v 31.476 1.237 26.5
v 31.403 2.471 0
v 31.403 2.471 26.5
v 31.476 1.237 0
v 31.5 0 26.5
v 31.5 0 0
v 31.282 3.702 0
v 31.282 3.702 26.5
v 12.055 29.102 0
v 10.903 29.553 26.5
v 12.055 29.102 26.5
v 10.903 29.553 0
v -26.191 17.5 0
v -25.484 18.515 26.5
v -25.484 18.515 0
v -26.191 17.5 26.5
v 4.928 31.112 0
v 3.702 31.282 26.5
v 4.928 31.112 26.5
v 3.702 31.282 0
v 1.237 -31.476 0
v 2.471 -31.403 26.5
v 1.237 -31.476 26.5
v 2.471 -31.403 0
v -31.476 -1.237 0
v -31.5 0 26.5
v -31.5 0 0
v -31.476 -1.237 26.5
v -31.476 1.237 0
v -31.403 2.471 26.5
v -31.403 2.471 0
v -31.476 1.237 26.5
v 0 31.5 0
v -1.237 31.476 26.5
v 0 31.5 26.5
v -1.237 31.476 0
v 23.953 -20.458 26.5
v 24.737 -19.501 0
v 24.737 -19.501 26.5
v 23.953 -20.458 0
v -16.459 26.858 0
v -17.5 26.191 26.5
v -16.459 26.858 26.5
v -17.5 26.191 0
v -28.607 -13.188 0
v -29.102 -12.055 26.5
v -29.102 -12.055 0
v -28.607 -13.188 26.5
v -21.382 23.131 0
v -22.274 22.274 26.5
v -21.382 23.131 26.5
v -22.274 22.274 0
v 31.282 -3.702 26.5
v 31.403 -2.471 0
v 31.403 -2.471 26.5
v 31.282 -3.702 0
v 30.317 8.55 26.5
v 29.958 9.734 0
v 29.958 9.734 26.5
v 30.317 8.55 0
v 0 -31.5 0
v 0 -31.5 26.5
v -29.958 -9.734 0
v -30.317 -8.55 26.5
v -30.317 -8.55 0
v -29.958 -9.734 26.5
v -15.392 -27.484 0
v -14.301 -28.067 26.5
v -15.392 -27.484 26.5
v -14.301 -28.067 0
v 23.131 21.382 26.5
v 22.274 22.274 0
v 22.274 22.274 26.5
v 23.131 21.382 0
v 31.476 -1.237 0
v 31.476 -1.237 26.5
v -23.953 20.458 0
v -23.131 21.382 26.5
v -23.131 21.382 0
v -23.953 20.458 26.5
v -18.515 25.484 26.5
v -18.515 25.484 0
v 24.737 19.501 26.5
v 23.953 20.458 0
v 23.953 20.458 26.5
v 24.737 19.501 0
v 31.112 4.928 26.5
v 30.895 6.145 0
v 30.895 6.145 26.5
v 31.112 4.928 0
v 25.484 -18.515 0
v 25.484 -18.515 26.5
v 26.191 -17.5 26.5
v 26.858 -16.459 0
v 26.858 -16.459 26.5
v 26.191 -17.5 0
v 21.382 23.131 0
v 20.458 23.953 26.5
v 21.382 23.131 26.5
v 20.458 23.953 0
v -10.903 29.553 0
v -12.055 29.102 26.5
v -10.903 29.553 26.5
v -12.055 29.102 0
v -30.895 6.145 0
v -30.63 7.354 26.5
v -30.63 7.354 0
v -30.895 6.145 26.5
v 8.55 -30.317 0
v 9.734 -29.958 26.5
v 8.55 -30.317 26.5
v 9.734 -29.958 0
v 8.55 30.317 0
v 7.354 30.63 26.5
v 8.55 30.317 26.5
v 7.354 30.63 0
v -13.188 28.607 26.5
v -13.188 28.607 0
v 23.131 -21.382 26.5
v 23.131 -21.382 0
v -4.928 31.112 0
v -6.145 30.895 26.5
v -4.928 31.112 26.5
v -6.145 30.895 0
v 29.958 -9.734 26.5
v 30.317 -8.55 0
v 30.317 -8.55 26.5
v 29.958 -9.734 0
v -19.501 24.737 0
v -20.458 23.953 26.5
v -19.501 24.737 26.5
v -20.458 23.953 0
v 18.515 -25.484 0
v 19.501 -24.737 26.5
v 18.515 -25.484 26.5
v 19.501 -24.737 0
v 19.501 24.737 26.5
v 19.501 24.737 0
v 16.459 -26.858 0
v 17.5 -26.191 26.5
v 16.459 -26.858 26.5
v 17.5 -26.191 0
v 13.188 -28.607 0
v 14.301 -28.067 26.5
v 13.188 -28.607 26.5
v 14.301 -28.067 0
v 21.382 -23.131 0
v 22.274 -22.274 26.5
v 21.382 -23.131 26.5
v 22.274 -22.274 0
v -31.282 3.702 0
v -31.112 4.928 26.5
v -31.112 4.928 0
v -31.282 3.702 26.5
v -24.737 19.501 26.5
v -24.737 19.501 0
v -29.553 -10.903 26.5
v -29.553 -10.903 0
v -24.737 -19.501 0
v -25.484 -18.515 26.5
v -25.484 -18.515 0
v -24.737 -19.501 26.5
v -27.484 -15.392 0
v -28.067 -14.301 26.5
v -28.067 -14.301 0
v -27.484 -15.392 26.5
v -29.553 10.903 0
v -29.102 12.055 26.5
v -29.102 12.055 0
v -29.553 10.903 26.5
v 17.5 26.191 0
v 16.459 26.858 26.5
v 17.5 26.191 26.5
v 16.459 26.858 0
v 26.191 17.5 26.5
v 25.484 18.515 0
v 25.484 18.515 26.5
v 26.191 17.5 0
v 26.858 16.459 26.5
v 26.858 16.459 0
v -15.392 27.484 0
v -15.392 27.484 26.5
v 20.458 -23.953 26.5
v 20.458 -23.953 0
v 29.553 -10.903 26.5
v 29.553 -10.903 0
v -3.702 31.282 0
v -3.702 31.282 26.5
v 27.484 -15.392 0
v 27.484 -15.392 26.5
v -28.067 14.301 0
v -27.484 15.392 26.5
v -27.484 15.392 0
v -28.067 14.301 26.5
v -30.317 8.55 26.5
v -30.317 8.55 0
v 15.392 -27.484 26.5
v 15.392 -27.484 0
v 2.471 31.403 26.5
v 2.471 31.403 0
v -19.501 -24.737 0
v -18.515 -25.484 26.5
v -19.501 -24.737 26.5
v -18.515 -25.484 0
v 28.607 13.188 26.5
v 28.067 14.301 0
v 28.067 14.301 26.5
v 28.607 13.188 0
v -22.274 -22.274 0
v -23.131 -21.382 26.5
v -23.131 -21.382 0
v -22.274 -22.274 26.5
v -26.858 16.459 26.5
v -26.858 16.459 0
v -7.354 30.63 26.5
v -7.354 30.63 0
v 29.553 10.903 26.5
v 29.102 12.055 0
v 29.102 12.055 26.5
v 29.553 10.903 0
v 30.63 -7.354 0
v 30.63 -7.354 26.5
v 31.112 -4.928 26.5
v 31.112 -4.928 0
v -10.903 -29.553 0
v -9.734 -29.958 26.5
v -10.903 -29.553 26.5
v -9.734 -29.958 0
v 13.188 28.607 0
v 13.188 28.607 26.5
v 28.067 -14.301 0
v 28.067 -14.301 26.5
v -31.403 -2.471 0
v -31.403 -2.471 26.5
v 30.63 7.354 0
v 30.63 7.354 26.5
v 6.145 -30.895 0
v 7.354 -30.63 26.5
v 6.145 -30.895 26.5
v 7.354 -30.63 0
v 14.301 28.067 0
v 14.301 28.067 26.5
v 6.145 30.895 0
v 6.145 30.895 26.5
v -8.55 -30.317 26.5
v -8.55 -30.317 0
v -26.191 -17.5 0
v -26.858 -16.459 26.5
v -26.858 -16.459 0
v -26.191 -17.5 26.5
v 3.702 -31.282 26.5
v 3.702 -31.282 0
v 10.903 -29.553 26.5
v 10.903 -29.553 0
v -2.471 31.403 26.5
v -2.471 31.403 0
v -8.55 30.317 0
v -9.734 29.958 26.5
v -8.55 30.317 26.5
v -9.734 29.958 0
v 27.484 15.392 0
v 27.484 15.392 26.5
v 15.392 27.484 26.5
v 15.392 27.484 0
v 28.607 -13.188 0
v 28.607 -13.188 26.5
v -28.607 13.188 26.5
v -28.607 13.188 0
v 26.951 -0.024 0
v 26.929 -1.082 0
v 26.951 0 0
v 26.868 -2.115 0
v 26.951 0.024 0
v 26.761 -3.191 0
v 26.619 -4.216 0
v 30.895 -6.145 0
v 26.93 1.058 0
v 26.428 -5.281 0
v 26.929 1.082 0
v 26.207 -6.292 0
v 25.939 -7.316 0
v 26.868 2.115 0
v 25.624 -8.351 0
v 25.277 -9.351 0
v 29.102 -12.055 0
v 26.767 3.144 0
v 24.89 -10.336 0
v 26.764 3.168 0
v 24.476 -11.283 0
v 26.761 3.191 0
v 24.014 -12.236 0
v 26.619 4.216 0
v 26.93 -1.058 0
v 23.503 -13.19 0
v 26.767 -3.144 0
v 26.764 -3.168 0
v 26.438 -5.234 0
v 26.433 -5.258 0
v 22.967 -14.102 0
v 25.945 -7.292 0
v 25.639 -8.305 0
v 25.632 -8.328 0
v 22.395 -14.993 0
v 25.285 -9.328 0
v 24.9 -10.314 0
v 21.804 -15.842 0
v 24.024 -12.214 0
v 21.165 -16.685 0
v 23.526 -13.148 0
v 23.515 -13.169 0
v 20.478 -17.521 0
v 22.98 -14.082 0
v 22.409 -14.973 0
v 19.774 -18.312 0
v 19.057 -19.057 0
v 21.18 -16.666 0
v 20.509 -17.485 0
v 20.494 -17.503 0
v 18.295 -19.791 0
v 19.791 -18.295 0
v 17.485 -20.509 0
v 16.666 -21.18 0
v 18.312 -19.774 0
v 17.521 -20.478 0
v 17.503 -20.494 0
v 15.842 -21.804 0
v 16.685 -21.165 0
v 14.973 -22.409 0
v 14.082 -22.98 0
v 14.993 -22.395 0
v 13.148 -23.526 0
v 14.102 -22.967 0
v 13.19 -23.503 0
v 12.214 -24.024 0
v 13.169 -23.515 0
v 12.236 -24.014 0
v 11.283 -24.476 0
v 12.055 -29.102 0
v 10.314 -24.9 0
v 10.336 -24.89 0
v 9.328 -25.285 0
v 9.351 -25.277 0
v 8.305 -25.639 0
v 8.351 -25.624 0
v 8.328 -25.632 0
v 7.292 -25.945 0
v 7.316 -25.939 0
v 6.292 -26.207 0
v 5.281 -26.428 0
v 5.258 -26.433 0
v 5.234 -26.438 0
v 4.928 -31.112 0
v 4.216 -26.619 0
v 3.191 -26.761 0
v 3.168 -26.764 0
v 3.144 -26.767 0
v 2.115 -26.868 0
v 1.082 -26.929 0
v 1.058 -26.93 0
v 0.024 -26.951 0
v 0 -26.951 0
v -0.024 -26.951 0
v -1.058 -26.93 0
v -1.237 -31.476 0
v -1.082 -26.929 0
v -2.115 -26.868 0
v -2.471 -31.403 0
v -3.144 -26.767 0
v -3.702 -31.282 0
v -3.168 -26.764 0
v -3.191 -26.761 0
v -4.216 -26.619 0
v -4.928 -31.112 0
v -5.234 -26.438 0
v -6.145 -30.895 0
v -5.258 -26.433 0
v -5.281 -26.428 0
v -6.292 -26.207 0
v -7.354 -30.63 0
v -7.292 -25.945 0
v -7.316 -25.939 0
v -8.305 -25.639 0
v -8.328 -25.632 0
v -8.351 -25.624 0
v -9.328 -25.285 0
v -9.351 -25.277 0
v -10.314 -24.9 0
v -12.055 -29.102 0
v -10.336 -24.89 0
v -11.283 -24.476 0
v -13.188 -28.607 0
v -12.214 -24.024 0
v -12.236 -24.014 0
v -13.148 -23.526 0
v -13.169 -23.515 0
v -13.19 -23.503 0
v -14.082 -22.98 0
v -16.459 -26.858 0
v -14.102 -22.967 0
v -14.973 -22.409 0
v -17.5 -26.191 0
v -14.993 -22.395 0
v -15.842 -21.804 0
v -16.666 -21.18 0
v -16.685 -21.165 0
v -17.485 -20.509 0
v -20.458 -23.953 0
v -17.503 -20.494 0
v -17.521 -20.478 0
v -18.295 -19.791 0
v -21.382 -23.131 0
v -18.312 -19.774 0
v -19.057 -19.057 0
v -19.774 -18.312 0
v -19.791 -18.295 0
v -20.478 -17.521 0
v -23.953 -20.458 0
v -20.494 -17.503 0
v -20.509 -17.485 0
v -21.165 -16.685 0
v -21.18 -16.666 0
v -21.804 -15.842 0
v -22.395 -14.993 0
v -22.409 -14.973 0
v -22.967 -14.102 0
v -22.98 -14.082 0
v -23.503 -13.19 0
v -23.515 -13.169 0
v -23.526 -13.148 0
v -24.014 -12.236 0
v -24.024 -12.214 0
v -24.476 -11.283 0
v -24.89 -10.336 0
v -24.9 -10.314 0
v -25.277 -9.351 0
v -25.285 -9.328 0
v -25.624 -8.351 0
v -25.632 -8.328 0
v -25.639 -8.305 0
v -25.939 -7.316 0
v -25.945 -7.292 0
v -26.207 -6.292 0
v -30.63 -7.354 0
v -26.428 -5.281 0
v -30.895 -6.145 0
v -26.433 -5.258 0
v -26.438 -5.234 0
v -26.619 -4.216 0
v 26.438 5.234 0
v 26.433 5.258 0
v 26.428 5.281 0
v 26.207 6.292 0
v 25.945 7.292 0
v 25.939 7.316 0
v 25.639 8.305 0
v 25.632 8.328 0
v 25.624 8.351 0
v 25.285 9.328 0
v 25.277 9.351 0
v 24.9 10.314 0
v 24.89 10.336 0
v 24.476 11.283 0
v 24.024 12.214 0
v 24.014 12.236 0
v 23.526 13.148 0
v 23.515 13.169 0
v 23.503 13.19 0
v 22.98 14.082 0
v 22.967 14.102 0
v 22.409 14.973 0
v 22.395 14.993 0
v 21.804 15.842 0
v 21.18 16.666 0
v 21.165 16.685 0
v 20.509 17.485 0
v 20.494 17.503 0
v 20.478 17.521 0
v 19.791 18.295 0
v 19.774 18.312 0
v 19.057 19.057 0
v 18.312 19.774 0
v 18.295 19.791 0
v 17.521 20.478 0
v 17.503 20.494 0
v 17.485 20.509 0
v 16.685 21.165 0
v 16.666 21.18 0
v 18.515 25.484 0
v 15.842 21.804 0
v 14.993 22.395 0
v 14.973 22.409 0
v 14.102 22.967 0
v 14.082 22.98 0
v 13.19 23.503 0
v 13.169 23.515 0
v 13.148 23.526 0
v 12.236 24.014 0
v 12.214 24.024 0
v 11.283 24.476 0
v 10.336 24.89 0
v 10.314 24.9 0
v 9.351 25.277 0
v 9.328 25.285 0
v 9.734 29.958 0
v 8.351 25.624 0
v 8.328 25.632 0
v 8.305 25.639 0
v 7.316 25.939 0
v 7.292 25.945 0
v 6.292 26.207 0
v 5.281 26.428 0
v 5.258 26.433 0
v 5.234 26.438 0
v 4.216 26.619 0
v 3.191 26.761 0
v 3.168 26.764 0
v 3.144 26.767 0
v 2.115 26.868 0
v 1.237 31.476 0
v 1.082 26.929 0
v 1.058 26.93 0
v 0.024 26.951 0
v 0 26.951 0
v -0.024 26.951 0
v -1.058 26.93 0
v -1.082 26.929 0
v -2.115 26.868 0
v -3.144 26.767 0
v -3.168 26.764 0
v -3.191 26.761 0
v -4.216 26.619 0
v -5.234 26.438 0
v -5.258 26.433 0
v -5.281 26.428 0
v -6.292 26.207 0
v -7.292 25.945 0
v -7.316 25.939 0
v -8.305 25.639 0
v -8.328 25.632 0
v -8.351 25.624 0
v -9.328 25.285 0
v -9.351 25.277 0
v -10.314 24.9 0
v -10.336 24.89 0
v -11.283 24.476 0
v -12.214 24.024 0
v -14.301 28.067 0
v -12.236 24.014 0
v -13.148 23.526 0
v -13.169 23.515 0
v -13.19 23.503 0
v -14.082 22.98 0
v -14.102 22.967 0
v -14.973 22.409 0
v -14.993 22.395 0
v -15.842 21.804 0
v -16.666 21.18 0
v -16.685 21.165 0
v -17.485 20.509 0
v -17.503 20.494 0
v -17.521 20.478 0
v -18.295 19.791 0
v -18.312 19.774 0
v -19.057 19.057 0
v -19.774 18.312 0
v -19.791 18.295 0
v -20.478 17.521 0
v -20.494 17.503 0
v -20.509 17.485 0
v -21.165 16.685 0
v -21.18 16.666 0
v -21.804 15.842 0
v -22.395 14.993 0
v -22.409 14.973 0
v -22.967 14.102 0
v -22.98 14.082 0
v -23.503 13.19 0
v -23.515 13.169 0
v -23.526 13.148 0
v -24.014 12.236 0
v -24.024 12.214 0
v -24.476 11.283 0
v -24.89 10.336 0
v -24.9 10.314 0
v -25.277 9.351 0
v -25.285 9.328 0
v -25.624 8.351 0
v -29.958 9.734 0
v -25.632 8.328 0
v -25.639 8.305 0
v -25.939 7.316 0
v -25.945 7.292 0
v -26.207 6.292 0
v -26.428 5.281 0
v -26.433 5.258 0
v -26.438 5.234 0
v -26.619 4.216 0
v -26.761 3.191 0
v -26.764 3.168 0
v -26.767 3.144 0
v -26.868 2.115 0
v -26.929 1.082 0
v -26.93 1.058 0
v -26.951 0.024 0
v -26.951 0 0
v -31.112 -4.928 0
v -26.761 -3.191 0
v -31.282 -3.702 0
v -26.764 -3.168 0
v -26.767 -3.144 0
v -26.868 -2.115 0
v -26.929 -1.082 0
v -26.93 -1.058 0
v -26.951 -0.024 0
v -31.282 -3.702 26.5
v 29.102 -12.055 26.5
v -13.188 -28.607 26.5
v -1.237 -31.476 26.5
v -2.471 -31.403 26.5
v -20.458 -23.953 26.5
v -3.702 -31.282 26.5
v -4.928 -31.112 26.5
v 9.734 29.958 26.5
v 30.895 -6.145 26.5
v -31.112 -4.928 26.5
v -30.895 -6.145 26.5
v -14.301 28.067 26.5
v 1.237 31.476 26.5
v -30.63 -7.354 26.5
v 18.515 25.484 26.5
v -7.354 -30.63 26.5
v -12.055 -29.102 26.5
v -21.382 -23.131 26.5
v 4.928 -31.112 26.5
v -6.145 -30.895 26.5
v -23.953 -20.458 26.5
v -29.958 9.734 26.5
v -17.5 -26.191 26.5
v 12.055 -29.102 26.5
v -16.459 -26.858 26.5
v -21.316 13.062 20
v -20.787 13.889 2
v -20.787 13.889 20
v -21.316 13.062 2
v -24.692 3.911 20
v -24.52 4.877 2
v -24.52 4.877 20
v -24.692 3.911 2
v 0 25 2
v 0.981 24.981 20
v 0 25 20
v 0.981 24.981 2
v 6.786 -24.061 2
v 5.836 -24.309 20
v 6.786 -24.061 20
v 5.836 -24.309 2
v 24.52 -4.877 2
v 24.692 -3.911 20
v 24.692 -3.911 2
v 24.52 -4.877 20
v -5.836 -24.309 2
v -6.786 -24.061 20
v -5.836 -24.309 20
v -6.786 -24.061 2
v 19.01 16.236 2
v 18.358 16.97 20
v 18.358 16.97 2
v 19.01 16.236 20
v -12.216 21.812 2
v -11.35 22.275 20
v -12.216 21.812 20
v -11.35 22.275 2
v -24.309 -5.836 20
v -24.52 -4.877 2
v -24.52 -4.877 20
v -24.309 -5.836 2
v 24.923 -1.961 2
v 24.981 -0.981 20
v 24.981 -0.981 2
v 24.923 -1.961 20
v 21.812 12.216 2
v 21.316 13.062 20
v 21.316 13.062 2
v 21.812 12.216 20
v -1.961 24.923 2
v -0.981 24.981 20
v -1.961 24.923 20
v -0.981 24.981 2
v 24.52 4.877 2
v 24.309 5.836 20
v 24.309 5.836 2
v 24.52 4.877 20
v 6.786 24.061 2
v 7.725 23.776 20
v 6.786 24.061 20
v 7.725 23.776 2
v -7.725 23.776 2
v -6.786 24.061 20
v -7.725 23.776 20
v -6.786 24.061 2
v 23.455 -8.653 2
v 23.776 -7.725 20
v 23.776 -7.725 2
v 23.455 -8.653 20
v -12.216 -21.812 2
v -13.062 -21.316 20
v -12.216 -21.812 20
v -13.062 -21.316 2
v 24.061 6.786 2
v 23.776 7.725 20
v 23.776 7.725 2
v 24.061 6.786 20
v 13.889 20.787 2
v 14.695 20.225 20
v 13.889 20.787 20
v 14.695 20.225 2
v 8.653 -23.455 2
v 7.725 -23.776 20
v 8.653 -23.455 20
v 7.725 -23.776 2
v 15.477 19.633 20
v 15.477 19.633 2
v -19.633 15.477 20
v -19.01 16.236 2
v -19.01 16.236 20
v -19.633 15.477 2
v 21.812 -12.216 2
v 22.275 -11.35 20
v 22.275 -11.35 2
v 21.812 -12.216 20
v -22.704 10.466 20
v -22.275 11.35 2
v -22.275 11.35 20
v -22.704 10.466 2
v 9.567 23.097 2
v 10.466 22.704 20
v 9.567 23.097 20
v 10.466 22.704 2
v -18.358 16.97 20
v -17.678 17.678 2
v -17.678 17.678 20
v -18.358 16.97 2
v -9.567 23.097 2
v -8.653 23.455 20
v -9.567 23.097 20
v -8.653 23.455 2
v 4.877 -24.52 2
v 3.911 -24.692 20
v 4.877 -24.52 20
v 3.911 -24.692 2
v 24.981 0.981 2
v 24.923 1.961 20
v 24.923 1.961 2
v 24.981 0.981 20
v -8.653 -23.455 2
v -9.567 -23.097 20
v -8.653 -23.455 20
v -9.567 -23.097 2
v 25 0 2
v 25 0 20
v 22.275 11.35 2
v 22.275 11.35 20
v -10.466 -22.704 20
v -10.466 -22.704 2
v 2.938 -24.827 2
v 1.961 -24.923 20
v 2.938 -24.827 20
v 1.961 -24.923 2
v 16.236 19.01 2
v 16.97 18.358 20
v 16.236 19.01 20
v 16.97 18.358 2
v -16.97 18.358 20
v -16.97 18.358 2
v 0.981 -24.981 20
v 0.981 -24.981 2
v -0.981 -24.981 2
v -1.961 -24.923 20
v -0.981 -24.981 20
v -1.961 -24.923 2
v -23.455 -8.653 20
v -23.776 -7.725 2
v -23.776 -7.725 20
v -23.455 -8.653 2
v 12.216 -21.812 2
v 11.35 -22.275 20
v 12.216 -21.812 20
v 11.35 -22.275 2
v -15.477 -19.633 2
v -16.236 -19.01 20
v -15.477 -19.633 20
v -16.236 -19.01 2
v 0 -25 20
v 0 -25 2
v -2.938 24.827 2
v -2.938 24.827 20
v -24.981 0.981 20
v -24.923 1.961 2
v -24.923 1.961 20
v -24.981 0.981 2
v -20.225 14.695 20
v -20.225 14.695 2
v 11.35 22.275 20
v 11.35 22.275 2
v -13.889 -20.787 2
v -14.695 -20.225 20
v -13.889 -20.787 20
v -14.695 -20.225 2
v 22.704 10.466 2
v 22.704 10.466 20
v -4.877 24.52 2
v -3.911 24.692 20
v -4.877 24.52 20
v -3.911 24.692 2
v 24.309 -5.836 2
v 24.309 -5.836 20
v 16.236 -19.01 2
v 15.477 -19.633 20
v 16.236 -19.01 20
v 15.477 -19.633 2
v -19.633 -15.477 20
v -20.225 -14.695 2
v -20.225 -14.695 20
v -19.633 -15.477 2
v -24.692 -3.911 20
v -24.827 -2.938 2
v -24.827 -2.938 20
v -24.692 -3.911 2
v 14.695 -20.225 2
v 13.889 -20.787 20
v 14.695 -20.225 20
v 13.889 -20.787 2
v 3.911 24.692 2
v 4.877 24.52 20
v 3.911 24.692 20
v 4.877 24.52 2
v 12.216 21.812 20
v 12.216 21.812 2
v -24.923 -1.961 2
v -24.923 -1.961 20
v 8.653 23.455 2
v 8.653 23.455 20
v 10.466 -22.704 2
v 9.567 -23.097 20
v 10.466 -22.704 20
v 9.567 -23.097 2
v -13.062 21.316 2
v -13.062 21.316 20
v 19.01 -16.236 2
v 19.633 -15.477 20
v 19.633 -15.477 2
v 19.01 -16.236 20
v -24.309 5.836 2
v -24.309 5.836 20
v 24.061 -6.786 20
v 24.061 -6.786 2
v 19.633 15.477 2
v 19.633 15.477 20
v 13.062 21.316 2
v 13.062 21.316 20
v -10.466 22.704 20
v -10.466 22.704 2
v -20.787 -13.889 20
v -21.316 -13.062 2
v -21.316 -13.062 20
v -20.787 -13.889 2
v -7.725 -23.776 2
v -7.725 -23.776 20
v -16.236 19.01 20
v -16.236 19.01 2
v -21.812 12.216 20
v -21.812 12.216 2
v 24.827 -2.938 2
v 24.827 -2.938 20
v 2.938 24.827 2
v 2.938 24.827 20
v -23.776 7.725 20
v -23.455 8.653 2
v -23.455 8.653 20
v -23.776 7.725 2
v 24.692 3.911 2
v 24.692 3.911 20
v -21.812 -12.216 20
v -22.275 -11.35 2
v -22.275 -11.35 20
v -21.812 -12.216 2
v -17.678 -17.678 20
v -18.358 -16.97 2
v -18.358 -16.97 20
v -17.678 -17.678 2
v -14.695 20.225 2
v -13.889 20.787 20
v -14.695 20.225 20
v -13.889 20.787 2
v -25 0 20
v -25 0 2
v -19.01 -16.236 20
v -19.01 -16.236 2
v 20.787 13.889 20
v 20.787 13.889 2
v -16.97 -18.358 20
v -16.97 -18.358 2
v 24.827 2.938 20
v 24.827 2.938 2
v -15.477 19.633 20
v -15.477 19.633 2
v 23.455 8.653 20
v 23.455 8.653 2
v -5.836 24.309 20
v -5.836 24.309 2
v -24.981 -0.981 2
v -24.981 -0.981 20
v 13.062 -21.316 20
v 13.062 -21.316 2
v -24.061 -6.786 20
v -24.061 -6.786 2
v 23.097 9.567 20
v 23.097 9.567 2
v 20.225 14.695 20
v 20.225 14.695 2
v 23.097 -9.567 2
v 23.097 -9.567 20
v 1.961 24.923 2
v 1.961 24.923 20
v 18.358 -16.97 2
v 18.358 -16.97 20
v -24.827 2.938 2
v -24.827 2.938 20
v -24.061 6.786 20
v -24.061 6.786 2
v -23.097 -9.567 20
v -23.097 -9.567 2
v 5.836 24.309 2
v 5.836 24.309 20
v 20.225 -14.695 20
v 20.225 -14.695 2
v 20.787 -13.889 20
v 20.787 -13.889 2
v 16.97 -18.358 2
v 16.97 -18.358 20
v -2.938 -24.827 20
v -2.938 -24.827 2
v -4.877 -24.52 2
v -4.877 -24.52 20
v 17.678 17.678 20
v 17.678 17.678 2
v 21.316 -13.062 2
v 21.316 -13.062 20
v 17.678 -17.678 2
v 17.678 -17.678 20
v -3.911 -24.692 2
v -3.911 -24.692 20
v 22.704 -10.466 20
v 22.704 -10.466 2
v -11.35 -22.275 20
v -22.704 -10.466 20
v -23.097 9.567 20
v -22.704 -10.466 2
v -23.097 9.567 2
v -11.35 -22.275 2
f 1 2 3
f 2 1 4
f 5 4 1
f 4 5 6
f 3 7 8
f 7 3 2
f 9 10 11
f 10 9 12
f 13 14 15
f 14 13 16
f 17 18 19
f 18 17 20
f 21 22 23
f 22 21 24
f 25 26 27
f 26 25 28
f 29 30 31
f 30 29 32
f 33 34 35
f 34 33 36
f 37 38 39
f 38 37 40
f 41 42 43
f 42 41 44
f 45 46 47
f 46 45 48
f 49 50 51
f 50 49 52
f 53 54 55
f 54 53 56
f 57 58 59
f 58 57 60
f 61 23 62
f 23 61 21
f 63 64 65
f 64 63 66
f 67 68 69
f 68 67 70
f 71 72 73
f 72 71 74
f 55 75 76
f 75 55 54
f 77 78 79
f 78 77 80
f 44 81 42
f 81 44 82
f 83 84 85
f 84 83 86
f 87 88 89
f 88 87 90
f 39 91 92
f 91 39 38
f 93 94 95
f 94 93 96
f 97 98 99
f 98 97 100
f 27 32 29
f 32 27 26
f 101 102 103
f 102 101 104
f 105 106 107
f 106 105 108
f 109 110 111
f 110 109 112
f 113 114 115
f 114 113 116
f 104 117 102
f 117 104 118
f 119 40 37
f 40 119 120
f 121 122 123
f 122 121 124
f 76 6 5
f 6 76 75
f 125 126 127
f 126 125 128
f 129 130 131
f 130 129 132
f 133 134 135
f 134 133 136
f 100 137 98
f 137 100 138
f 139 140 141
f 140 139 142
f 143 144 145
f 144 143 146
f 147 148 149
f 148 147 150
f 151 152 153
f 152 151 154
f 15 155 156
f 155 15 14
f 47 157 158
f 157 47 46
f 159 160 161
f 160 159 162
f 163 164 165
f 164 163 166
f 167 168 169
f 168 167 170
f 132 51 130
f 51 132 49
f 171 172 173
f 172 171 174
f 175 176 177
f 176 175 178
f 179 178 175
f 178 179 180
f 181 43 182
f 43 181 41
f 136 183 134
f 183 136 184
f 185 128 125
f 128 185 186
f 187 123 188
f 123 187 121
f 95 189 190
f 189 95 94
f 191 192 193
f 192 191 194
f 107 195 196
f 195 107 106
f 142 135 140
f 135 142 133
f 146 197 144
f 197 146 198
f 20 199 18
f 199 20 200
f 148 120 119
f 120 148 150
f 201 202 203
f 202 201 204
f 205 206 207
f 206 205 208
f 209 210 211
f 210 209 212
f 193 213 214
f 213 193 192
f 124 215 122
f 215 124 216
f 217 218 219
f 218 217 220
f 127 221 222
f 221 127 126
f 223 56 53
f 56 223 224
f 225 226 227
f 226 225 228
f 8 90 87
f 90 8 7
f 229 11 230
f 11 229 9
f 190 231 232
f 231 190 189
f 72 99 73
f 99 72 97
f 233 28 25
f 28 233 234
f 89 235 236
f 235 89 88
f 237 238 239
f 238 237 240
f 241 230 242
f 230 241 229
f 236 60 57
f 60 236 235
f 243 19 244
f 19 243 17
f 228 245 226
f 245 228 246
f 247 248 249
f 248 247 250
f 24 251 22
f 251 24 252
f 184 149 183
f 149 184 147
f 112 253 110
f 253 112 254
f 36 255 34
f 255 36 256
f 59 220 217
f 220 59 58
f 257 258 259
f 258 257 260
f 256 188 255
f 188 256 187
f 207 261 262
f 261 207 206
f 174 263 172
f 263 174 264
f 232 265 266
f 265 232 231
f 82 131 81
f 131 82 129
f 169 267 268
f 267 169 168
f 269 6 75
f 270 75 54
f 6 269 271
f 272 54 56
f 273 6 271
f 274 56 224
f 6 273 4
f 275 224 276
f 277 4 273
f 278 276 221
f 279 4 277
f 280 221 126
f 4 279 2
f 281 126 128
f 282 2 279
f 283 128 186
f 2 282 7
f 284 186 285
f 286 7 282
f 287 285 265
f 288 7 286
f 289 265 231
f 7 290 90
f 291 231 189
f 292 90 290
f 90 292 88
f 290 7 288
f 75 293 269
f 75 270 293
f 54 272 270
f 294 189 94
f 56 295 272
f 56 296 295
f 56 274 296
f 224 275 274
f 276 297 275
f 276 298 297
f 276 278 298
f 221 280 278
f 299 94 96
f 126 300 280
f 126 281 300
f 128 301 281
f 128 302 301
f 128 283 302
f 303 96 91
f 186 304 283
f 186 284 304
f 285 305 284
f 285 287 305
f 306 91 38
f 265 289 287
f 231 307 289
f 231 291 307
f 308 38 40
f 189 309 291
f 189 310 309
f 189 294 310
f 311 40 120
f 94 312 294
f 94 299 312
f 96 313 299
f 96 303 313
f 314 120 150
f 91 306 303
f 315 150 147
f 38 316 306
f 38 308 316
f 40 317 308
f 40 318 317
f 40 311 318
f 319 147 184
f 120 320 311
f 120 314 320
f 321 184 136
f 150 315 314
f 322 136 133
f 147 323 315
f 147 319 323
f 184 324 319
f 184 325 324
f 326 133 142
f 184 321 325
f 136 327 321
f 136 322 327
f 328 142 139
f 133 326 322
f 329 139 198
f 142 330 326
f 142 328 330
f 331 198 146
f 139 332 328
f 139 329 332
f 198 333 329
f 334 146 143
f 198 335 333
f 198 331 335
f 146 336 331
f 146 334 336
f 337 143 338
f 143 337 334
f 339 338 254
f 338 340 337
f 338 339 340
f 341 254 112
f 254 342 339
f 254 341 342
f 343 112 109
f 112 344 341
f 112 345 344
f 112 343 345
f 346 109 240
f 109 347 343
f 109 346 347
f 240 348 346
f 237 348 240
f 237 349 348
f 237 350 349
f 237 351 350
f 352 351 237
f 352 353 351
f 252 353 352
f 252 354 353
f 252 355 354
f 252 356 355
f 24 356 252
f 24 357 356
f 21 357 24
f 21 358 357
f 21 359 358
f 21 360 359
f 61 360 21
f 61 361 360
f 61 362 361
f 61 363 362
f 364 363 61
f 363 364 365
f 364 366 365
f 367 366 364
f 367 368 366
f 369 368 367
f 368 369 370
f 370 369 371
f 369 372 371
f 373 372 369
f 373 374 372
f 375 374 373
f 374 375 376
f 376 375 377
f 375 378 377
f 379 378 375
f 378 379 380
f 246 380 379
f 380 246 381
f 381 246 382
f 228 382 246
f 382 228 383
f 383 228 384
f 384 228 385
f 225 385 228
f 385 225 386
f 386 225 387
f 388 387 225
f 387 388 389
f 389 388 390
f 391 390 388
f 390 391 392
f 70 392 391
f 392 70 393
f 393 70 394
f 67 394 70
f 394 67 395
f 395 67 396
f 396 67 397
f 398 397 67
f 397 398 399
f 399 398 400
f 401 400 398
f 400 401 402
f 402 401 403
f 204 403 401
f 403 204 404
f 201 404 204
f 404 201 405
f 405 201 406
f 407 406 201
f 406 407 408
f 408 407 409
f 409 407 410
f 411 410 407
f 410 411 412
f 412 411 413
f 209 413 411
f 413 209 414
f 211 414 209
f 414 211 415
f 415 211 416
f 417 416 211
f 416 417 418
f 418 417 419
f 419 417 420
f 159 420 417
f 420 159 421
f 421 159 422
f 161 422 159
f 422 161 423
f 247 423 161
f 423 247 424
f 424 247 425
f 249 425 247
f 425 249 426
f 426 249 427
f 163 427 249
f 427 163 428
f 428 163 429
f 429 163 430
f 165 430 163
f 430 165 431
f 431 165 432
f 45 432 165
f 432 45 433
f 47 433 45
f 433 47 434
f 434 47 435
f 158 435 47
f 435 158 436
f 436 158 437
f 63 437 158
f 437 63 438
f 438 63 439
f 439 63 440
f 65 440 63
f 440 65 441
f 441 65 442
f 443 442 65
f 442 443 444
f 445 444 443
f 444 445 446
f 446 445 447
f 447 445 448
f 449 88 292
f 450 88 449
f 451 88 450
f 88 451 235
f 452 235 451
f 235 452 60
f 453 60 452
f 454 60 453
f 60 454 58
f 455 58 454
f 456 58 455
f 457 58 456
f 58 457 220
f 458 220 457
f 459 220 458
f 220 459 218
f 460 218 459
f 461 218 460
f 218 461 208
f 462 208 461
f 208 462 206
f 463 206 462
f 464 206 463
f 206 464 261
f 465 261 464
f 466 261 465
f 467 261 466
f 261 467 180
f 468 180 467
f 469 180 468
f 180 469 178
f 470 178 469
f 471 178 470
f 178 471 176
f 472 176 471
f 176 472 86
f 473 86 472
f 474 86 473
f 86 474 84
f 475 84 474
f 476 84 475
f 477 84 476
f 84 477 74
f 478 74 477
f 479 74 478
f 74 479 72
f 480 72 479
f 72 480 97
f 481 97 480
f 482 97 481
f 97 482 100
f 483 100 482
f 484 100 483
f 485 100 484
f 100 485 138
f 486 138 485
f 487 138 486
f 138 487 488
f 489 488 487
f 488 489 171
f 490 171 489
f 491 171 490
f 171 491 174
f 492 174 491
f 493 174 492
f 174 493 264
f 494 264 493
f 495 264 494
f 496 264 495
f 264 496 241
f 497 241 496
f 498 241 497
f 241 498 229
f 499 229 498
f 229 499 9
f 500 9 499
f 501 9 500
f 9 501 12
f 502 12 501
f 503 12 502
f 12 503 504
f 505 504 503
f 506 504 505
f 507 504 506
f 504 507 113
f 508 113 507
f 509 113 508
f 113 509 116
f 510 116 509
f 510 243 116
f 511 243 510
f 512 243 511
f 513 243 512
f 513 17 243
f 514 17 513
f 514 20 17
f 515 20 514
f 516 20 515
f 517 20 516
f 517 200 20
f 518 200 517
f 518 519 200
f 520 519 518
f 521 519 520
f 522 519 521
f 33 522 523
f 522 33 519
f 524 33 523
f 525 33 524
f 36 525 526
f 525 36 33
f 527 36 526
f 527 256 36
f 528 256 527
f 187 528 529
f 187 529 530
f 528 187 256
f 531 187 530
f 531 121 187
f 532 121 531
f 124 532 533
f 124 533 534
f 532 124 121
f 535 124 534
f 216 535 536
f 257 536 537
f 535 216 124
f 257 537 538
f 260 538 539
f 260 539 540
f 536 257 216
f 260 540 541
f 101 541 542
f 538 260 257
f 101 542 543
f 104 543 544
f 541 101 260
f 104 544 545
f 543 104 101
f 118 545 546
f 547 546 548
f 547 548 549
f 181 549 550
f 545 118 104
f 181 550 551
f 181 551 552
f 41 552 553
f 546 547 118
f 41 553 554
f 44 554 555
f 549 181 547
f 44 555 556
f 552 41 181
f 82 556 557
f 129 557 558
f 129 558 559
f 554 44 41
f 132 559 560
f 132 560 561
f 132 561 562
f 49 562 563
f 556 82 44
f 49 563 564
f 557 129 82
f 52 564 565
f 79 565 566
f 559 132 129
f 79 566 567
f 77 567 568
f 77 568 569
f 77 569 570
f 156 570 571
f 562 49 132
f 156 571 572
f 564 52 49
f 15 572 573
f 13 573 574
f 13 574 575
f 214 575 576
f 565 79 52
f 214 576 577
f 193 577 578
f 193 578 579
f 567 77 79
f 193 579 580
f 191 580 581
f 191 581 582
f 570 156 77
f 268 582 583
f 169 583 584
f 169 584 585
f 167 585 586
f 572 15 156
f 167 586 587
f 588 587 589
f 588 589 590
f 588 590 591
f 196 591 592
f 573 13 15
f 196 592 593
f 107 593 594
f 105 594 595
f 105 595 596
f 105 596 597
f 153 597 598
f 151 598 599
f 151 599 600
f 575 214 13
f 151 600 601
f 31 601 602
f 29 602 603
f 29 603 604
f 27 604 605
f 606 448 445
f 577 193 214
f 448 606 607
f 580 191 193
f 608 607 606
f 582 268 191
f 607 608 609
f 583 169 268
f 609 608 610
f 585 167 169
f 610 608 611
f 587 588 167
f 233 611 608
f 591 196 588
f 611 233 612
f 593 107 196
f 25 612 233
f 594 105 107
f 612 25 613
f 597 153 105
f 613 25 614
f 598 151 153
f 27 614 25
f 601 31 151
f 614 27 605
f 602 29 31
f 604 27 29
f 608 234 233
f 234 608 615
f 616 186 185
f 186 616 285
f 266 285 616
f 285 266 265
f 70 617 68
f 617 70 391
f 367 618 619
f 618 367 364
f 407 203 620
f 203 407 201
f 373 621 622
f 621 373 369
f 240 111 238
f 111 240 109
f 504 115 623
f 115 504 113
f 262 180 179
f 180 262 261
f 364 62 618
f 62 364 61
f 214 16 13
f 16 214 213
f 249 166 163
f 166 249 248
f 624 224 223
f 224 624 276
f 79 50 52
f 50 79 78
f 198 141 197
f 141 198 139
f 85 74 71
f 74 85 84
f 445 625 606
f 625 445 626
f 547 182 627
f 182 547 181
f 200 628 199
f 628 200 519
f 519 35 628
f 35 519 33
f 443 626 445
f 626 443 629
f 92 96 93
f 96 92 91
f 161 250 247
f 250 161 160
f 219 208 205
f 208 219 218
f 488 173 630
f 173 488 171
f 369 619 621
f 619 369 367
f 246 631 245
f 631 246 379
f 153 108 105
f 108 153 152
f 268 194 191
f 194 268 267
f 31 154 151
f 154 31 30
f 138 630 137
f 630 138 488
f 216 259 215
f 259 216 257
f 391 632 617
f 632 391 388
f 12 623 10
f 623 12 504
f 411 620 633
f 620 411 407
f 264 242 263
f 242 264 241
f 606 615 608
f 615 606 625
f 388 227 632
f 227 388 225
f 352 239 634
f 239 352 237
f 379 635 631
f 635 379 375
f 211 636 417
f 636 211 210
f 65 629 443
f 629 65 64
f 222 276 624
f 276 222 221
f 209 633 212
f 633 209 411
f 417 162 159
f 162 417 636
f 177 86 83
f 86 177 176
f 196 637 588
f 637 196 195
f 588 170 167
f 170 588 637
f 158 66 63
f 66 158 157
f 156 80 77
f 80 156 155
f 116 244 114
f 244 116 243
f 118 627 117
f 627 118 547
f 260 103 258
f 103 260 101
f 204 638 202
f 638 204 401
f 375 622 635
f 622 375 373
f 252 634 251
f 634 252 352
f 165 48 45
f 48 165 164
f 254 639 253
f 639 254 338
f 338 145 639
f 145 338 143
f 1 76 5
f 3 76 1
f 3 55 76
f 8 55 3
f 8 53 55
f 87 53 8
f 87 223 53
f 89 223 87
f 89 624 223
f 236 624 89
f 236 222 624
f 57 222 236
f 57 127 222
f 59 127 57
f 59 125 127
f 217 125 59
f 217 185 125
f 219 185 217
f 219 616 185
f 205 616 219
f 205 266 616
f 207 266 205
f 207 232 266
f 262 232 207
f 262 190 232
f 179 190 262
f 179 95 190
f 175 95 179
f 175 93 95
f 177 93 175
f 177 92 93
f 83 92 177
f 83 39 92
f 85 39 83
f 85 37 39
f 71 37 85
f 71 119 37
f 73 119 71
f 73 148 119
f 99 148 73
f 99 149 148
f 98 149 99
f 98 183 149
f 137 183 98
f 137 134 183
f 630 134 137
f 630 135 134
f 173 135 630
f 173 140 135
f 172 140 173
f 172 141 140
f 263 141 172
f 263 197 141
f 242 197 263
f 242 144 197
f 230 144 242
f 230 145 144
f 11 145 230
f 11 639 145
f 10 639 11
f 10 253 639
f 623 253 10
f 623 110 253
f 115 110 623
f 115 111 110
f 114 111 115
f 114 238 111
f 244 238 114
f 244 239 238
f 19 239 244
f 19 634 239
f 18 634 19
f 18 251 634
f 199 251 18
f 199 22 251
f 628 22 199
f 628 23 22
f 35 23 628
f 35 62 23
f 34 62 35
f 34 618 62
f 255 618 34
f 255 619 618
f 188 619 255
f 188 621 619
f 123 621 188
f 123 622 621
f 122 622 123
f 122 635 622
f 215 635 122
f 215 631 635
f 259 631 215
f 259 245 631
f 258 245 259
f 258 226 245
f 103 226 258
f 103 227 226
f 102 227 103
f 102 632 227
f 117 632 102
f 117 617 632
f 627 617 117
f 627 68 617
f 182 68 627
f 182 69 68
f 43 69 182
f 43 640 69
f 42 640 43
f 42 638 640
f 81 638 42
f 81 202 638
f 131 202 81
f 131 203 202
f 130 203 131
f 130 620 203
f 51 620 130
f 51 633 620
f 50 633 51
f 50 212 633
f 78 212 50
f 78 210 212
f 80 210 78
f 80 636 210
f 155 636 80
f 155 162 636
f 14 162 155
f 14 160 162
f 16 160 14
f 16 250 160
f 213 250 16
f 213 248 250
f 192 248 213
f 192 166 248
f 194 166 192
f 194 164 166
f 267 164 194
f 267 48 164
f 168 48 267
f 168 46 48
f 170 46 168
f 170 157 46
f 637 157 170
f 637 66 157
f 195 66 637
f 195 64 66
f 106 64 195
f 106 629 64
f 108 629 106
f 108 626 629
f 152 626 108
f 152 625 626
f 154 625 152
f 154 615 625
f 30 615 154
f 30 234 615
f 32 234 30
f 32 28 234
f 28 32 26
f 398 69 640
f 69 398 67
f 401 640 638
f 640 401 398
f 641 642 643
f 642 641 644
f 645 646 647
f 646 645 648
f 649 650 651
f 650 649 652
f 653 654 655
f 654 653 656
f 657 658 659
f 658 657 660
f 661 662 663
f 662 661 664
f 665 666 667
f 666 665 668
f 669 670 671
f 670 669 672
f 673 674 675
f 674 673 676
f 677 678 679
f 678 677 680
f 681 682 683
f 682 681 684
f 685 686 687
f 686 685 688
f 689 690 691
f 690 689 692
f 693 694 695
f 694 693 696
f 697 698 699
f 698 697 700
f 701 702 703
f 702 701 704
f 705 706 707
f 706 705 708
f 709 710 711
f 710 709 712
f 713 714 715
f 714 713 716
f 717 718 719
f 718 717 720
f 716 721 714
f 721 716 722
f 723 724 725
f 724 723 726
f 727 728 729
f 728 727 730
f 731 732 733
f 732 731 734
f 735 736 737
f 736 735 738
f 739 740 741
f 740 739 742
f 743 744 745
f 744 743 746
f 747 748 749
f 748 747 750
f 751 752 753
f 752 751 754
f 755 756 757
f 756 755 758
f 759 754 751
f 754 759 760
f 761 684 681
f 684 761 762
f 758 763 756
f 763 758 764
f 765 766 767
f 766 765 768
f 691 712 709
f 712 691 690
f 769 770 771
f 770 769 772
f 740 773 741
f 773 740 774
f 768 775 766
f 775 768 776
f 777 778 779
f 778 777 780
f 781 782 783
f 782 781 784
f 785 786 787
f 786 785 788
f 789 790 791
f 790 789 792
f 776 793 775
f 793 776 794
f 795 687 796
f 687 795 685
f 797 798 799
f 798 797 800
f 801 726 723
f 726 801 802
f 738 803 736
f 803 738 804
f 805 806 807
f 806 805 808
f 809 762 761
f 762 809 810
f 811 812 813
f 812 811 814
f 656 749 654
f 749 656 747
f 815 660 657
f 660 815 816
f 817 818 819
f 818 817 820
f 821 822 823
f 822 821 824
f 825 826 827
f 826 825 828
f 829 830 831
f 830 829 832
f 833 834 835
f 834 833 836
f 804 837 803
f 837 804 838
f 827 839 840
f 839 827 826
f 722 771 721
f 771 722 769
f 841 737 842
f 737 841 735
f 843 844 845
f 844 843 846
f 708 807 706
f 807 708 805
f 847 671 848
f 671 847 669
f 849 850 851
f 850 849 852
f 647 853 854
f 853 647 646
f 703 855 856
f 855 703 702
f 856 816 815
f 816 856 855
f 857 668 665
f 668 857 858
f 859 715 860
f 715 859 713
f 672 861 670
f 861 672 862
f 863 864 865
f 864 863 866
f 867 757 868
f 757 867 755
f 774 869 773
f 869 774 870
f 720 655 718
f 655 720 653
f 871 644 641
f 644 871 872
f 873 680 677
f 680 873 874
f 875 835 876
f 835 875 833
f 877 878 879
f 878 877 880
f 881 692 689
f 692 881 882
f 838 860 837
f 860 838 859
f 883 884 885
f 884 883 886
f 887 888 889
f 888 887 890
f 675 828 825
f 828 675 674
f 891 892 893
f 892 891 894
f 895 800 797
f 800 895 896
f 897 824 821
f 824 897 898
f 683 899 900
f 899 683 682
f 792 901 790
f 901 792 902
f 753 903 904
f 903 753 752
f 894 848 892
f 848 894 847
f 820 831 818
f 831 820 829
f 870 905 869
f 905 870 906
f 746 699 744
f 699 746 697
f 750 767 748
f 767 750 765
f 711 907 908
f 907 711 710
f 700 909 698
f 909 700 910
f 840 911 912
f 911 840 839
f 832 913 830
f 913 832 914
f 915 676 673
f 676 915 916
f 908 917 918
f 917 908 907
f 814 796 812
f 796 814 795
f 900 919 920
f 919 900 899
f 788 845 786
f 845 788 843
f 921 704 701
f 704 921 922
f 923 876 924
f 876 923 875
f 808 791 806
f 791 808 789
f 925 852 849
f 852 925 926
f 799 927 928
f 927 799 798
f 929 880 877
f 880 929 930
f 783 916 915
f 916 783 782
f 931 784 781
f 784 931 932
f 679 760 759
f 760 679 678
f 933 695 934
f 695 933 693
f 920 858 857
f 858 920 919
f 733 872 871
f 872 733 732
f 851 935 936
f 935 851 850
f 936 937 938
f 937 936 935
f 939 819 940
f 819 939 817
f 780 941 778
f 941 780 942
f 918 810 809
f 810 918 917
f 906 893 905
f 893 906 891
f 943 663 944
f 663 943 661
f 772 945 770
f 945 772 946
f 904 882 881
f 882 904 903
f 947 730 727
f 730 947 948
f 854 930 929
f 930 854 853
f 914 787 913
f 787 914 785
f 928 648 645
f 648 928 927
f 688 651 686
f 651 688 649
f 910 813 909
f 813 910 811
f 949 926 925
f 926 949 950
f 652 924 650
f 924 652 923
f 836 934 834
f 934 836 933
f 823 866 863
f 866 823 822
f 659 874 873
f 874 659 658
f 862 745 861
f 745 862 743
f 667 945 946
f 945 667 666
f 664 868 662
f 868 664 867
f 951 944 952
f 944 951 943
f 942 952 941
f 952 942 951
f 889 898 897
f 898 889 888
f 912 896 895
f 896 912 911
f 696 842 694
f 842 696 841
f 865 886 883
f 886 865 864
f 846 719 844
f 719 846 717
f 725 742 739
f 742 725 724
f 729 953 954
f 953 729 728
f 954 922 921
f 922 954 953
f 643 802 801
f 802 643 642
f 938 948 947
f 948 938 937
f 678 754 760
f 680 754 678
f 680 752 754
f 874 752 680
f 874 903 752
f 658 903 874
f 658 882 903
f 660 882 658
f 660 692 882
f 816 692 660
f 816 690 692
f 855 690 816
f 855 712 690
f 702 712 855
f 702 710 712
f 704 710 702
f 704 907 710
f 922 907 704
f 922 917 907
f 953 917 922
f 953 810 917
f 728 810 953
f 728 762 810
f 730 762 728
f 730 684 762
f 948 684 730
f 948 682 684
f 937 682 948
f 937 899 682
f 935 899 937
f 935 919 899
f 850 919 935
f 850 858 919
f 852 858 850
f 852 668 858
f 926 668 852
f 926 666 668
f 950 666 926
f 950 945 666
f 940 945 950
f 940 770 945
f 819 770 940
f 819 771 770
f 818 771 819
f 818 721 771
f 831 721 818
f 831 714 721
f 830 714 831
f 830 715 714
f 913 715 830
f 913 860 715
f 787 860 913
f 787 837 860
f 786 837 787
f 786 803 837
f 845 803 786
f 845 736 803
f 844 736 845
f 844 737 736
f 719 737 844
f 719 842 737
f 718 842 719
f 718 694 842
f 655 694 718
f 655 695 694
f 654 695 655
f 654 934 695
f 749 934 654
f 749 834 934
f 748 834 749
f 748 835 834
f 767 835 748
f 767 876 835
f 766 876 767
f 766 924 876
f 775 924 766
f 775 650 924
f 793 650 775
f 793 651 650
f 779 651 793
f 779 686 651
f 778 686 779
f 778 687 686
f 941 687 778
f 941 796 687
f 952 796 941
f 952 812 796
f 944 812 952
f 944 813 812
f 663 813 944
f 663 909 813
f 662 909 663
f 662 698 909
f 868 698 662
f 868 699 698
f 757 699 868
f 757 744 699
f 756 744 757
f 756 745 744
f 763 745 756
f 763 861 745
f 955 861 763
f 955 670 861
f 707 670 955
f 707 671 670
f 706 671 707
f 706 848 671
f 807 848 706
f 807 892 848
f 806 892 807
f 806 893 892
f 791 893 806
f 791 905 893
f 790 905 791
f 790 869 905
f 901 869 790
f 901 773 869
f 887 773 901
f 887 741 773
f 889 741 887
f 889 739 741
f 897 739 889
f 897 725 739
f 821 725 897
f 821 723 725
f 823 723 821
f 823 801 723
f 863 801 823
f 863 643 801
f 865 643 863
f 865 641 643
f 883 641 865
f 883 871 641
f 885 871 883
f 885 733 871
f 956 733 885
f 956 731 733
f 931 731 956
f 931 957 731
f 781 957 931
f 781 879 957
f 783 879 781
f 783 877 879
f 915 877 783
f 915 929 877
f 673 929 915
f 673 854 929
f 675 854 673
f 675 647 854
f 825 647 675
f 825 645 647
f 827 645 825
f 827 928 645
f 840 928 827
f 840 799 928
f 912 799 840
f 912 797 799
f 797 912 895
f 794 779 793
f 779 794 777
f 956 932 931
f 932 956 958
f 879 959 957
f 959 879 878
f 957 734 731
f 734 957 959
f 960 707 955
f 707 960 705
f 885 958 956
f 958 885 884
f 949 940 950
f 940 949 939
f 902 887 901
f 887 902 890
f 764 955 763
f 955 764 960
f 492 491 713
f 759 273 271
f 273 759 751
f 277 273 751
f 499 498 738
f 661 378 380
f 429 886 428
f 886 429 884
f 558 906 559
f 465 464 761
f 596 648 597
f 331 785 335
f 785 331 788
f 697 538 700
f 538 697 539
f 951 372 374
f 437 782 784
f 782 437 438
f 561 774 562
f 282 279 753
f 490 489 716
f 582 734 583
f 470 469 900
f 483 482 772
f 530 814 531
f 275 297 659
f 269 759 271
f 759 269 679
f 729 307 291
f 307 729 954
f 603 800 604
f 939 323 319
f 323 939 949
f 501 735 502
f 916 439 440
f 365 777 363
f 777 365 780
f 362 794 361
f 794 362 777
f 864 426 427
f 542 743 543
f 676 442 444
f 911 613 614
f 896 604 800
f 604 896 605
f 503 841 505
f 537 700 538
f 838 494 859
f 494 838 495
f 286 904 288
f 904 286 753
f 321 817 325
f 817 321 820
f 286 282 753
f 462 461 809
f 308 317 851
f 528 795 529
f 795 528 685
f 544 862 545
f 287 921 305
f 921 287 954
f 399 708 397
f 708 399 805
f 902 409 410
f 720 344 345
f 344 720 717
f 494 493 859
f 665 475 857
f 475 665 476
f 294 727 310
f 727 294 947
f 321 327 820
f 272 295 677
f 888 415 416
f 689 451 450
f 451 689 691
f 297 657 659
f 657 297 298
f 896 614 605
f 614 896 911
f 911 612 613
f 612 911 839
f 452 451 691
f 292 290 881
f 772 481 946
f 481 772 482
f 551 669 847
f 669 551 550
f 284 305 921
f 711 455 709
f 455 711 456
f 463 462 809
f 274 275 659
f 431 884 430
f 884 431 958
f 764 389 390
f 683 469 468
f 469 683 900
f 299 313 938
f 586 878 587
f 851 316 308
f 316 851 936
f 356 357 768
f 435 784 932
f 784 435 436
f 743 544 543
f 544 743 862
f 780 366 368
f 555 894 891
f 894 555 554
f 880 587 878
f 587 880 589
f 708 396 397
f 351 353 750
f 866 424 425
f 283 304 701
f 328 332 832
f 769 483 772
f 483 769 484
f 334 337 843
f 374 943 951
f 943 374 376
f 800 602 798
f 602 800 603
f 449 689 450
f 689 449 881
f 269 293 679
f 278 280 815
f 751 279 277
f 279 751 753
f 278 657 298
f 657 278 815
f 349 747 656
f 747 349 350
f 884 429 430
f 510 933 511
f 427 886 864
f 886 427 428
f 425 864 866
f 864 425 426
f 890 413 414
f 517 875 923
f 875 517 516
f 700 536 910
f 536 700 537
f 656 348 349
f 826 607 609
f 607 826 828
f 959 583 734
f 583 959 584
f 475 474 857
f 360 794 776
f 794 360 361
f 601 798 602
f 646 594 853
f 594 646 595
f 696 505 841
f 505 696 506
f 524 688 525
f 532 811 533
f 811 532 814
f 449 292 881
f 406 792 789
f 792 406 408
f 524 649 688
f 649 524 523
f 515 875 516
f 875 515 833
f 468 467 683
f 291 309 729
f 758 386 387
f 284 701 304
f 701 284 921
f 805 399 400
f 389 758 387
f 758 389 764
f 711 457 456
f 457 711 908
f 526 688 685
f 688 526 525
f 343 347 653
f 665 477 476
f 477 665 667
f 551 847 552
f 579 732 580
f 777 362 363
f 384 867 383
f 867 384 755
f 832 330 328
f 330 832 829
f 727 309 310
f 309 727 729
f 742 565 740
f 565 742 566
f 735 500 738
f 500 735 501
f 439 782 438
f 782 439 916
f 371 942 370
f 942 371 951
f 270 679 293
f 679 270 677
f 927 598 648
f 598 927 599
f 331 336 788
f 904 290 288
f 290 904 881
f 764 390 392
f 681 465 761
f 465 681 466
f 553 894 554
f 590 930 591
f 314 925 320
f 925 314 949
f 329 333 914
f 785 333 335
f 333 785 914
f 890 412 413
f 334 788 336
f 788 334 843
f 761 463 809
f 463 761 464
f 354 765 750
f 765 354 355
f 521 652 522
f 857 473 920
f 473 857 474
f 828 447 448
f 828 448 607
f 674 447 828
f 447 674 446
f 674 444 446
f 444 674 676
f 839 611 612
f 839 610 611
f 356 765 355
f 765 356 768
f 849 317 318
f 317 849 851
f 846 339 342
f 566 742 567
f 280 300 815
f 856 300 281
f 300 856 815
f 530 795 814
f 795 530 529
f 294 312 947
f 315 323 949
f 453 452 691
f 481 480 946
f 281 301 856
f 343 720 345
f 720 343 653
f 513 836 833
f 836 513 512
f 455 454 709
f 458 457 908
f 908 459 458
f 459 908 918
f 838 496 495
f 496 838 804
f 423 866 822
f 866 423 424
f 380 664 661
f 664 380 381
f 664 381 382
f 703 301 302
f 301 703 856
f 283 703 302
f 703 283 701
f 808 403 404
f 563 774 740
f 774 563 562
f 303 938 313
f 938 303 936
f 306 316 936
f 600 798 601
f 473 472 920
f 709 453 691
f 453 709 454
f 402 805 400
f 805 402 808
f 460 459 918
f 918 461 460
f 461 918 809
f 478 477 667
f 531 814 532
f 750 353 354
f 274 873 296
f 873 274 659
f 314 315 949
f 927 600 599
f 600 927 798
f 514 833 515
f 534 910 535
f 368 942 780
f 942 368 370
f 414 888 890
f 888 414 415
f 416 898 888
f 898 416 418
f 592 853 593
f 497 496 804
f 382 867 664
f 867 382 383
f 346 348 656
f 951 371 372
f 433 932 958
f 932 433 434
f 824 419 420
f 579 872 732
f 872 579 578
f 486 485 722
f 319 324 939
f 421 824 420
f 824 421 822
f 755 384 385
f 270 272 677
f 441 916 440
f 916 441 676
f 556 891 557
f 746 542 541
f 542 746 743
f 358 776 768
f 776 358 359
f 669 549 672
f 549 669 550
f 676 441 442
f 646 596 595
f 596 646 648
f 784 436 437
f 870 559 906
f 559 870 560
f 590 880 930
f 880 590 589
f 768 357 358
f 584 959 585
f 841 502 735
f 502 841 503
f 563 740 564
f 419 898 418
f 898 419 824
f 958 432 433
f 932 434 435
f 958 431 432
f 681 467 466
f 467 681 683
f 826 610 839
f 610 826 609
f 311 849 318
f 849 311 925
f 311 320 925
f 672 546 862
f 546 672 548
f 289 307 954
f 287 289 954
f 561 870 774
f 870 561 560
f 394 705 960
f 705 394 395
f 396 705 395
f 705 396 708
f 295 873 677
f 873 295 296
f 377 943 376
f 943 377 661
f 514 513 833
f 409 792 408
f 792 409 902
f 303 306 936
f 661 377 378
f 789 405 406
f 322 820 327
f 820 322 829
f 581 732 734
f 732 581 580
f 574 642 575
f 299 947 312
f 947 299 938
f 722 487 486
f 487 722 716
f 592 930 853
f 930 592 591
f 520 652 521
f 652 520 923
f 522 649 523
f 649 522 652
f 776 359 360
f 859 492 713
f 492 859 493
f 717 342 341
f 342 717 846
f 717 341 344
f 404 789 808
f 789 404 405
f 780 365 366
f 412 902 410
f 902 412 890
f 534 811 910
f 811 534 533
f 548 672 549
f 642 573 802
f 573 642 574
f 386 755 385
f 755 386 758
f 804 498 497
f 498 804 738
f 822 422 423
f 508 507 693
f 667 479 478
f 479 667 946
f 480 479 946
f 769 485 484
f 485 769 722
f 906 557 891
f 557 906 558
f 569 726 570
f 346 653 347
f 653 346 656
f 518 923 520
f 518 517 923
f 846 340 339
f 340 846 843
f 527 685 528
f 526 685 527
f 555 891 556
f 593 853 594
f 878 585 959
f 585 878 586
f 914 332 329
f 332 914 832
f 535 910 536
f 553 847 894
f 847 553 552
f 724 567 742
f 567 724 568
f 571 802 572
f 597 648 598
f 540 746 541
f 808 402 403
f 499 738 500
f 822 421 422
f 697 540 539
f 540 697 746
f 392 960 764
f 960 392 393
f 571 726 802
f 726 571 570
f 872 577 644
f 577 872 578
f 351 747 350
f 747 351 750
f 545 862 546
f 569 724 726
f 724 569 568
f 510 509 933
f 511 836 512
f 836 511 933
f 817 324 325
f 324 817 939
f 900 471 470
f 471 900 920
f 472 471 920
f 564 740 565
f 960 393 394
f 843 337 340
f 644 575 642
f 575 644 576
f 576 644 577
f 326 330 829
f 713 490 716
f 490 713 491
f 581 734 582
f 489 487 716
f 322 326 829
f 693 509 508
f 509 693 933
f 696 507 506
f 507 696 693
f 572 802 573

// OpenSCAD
// HT 50 pipe cap (socket end cap) - single connected solid

$fn = 160;

// Parameters (mm)
cap_diameter        = 63;   // outer diameter of cap
pipe_outer_diameter = 50;   // socket diameter (fits over pipe OD)
insertion_depth     = 20;   // socket depth
wall_thickness      = (cap_diameter - pipe_outer_diameter) / 2; // radial wall
top_thickness       = wall_thickness; // closed end thickness
chamfer_size        = 2;    // lead-in chamfer height

eps = 0.05;

cap_height = insertion_depth + top_thickness;

module ht50_cap() {
    // Build from z=0 (mouth) to z=cap_height (closed top)
    difference() {
        // Outer body
        cylinder(h = cap_height, d = cap_diameter, center = false);

        // Inner socket void: starts at mouth and stops before the top thickness
        translate([0, 0, -eps])
            cylinder(h = insertion_depth + eps, d = pipe_outer_diameter, center = false);

        // Lead-in chamfer at the mouth (bottom), limited to chamfer height
        translate([0, 0, -eps])
            cylinder(h = chamfer_size + eps,
                     d1 = pipe_outer_diameter + 2*chamfer_size,
                     d2 = pipe_outer_diameter,
                     center = false);
    }
}

ht50_cap();
